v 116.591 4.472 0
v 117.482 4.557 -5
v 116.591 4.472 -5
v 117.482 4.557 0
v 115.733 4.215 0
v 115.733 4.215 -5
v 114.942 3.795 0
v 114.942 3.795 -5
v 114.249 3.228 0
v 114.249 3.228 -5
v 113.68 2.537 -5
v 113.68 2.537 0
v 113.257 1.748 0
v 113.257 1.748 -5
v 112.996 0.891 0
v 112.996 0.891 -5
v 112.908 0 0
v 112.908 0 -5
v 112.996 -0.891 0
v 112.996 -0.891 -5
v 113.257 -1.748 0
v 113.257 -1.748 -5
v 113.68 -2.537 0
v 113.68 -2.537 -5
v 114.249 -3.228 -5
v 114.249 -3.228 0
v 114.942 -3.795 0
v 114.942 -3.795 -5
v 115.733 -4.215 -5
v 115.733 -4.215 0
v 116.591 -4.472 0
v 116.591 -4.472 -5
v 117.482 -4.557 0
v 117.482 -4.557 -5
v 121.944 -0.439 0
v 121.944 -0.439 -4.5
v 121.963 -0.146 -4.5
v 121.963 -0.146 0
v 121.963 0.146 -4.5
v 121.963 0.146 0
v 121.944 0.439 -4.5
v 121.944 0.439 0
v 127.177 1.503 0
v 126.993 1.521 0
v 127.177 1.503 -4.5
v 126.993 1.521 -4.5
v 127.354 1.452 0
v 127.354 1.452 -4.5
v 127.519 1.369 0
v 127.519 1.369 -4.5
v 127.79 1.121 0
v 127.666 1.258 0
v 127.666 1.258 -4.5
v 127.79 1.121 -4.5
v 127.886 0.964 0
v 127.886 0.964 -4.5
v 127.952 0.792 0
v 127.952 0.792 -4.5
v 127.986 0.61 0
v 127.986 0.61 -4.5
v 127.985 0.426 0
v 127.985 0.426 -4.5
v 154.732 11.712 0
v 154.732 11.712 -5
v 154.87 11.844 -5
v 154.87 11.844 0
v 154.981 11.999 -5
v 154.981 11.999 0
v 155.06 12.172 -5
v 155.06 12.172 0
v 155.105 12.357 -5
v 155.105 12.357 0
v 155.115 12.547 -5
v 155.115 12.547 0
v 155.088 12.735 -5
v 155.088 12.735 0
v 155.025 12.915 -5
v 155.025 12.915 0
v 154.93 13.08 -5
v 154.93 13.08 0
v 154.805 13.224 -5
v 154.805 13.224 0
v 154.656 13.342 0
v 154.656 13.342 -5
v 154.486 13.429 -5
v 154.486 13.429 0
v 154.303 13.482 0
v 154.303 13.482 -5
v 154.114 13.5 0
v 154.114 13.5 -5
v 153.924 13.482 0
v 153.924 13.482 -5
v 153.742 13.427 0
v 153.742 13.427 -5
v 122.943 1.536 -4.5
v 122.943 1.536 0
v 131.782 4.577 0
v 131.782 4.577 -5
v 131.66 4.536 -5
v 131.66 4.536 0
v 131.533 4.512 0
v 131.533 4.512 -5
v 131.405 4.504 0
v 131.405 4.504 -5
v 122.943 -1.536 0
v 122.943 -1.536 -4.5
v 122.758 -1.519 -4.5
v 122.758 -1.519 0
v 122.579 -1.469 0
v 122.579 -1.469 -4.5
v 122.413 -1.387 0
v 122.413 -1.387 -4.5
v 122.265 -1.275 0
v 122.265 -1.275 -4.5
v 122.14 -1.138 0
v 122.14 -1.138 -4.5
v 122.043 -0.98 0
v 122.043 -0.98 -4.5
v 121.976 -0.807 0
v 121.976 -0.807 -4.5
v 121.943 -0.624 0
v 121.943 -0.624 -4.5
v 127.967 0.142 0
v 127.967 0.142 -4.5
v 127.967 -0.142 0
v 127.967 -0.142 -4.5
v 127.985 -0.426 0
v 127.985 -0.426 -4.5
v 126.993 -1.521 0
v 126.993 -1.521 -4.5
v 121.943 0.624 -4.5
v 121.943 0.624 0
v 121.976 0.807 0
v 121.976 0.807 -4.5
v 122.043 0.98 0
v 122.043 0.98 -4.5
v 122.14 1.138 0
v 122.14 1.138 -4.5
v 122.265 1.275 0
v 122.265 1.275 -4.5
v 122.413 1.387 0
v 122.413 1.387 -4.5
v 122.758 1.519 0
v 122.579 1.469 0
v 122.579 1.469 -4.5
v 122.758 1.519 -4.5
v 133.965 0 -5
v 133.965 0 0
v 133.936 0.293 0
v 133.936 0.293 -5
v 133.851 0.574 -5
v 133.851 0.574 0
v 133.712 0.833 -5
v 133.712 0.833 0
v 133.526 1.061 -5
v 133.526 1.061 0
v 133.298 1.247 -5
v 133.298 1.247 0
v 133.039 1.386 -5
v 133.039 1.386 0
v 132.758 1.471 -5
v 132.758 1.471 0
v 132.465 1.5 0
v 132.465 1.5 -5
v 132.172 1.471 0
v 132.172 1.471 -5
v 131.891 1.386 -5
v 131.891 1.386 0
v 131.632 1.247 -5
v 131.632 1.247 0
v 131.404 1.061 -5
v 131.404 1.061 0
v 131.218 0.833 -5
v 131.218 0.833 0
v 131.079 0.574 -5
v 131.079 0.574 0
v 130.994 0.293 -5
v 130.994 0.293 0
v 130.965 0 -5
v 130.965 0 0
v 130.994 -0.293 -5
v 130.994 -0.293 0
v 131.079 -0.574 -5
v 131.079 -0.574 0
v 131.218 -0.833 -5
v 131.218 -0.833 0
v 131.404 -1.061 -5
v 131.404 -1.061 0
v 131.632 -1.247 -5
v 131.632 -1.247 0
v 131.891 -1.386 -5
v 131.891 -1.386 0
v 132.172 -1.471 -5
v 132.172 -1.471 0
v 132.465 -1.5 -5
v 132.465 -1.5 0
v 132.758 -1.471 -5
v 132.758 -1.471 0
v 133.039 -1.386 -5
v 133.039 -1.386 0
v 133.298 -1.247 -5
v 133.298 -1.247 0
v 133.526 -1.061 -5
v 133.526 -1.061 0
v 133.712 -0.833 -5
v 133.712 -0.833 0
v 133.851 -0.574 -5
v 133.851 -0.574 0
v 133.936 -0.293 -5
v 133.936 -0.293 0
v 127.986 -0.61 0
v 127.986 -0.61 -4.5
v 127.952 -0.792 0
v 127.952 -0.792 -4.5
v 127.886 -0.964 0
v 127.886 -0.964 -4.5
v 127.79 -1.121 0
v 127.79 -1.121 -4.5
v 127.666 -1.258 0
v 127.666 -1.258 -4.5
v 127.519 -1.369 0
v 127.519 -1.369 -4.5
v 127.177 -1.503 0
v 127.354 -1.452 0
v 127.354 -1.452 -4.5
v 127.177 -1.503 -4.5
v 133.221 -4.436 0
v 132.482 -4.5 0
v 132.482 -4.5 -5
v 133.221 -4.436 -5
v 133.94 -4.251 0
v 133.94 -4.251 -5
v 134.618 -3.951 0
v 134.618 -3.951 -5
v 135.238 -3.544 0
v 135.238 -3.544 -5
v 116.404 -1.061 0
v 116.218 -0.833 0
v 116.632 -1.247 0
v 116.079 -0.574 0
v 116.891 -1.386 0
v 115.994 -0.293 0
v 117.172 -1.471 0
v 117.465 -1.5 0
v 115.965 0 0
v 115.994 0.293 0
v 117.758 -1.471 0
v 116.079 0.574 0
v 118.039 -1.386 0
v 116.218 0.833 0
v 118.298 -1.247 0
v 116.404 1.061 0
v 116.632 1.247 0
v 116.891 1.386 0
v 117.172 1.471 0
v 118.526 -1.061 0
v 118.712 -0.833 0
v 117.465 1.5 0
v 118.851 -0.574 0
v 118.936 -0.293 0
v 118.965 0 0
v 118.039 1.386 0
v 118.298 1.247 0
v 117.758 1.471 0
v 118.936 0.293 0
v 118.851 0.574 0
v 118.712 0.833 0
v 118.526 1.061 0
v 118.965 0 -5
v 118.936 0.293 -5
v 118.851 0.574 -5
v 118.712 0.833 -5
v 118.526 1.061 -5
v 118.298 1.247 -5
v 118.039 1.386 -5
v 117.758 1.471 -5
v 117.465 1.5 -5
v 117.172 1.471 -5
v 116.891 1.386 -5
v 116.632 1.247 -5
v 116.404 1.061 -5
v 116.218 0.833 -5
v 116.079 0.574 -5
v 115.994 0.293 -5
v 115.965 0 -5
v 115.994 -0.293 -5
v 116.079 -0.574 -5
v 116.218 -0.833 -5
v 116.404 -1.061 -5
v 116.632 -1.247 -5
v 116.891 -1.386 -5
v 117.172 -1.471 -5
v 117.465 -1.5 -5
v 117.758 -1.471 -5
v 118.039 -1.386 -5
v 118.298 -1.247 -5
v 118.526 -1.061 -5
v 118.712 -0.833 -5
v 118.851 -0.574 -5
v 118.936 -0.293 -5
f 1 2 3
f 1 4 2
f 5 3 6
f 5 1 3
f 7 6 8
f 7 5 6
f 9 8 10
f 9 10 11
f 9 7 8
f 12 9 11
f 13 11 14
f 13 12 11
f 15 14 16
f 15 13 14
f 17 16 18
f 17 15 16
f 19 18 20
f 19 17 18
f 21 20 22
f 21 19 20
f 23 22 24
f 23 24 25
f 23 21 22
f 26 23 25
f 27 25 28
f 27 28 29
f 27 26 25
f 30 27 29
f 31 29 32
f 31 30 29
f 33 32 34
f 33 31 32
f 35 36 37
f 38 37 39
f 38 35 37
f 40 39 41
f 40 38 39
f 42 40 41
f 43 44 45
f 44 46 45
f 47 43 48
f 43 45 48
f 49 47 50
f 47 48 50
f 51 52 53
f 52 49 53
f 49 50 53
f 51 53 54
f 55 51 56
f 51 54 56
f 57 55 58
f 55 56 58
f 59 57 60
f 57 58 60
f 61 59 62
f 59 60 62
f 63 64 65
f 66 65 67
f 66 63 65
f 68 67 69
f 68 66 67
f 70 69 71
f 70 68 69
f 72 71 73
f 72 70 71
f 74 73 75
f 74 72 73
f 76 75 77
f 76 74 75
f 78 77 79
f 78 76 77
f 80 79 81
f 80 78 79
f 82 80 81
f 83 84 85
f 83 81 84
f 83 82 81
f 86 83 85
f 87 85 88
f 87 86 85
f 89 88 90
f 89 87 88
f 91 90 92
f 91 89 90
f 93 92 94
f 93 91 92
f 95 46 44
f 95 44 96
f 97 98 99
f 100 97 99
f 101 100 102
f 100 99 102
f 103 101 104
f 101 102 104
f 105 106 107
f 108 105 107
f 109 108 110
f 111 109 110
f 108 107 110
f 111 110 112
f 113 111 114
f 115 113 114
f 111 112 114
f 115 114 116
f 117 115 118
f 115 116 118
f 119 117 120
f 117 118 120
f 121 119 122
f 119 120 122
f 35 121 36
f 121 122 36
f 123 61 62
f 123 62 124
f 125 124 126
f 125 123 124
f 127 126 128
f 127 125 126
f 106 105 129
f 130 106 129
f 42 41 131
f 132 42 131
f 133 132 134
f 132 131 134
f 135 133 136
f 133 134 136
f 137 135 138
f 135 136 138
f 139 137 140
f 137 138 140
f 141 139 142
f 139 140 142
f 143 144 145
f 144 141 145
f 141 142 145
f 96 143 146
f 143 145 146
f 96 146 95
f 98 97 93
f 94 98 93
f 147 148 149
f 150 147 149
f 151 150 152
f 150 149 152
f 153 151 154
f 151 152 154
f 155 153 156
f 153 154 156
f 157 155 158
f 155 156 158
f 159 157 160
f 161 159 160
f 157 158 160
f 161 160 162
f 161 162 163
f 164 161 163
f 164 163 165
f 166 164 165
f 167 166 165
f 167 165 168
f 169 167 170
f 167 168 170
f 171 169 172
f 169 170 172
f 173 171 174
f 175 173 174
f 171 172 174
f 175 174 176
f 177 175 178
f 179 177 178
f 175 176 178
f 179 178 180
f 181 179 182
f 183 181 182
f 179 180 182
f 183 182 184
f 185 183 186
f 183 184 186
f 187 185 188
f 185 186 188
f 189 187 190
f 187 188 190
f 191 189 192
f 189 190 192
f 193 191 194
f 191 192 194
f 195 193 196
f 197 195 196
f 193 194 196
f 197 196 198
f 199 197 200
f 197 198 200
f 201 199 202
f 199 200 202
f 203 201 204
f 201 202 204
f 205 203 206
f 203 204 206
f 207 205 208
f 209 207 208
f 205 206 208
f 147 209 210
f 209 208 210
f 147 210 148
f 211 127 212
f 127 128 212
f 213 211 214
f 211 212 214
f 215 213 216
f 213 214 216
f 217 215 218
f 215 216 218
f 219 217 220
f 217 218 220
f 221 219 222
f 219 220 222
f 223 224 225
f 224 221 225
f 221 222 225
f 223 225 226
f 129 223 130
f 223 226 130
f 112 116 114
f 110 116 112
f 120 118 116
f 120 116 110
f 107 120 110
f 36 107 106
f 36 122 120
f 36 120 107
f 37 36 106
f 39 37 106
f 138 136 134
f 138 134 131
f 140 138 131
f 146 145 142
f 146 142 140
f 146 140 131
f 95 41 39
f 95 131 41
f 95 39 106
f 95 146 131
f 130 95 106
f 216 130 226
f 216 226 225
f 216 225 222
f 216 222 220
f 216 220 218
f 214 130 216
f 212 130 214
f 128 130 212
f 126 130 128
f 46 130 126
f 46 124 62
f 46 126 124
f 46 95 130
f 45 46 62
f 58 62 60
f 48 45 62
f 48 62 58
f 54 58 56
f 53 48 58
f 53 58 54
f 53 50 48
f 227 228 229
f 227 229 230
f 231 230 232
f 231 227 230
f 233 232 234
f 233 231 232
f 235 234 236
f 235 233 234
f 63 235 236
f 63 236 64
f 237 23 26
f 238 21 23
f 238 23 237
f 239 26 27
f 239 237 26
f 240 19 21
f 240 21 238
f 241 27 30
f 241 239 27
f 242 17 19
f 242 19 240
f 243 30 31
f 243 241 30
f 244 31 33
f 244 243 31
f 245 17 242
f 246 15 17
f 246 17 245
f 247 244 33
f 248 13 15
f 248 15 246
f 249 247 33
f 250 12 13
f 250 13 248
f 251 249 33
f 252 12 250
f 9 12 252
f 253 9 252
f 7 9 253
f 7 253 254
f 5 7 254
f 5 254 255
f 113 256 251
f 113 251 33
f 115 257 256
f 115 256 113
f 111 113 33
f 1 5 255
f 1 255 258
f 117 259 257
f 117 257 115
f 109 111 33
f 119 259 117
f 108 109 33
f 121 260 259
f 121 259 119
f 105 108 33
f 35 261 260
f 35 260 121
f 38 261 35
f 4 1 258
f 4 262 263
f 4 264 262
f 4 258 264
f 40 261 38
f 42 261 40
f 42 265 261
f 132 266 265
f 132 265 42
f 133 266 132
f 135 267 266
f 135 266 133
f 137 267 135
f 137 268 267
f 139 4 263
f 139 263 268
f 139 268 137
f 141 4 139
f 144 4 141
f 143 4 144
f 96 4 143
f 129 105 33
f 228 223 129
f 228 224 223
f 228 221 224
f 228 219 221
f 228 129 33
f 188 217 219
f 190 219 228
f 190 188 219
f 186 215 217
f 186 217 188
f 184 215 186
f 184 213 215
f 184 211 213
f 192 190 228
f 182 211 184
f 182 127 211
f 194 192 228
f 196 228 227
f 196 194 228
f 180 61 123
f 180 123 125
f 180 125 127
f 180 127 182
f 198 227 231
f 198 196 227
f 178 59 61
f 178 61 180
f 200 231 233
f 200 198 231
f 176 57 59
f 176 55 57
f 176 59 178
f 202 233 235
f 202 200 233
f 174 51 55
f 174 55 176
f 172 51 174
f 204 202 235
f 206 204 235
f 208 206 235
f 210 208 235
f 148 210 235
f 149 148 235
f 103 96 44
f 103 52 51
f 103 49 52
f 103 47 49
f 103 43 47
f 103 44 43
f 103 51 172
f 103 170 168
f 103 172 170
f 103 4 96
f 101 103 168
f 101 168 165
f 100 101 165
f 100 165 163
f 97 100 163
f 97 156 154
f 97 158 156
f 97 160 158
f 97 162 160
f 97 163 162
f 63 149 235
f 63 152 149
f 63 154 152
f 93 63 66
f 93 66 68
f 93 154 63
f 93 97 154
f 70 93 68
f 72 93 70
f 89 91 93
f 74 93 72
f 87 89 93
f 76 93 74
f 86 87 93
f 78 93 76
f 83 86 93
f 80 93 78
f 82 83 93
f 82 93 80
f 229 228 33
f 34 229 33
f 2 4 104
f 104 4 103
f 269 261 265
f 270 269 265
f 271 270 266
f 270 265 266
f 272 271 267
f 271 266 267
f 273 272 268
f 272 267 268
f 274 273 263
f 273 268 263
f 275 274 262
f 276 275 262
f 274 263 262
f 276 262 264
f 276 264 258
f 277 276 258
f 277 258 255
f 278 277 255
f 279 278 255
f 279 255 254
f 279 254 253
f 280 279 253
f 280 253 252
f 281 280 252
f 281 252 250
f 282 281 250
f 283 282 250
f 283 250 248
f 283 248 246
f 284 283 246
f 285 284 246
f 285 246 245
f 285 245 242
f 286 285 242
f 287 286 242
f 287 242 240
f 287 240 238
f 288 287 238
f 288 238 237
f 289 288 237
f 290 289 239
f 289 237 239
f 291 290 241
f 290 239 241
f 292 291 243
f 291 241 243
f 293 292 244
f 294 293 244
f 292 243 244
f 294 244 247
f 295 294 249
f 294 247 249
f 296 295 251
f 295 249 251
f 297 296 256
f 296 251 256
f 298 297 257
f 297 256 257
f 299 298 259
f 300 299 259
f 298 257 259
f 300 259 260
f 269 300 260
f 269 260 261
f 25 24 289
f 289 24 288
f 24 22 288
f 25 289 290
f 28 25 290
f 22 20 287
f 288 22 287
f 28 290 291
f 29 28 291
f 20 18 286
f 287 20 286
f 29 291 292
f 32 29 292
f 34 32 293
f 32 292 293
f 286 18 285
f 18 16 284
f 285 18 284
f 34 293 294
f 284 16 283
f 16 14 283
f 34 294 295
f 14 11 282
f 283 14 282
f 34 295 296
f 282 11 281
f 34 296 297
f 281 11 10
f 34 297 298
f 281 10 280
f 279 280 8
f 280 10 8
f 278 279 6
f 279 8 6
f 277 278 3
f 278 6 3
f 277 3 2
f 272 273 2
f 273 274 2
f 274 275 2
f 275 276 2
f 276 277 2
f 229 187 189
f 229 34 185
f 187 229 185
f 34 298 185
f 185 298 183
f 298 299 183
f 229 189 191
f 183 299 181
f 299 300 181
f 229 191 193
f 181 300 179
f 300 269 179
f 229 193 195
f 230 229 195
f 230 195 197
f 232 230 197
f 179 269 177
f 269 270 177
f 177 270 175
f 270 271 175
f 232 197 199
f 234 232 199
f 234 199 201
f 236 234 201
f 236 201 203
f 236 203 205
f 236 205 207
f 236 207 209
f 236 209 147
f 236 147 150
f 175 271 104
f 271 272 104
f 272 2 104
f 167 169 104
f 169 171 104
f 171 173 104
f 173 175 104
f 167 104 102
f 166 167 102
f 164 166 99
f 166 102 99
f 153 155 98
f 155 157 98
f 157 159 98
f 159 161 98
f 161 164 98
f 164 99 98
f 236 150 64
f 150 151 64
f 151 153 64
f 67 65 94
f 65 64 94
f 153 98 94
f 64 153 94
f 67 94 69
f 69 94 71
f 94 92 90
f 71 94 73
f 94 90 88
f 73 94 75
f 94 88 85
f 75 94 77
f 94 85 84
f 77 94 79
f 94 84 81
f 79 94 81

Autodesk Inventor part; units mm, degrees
ref_plane "YZ Plane" through (0, 0, 0) normal (1, 0, 0) x (0, 1, 0)
ref_plane "XZ Plane" through (0, 0, 0) normal (0, 1, 0) x (-1, 0, 0)
ref_plane "XY Plane" through (0, 0, 0) normal (0, 0, 1) x (1, 0, 0)
sketch "スケッチ1" plane through (0, 0, 0) normal (0, 0, 1) x (1, 0, 0)
  circle A0 centre (132.465, 0) radius 1.5
  circle A1 centre (45, 0) radius 1.5
  circle A2 centre (102.465, 0) radius 1.5
  circle A3 centre (72.465, 0) radius 1.5
  circle A4 centre (15, 0) radius 1.5
  circle A5 centre (30, 0) radius 1.5
  circle A6 centre (87.465, 0) radius 1.5
  circle A7 centre (117.465, 0) radius 1.5
  circle A8 centre (60, 0) radius 1.5
  circle A9 centre (0, 0) radius 1.5
  line L0 (132.482, -4.5) -> (0.0189, -5)
  arc A10 (0.0189, 5) -> (0.0189, -5) centre (0, 0) ccw
  line L1 (0.0189, 5) -> (132.482, 4.5)
  arc A11 (132.482, -4.5) -> (132.482, 4.5) centre (132.465, 0) ccw
  circle A12 centre (117.465, 0) radius 4.5566
  line L2 (135.2384, -3.5437) -> (160.3015, 16.0714)
  circle A13 centre (132.465, 0) radius 4.5
  line L3 (130.7828, 4.1737) -> (160.3015, 16.0714)
  circle A14 centre (154.1156, 12.5) radius 1
  point P0 (117.4822, -4.5566)
  point P1 (154.732, 11.7125)
  point P2 (153.7418, 13.4275)
  point P3 (131.6004, 4.5033)
  point P4 (117.4822, 4.5566)
  dimension "d0" = 2
  dimension "d1" = 25
  dimension "d2" = 150
extrude "押し出し1" add sketch "スケッチ1" against normal blind 5 contours A13 A11 | L0 A12 L1 L3 A13 | A12 | A11 L1 L3 A14 L2 | L3 L1 A13 | A14
fillet "フィレット1" radius 1 1 edges at (131.6004, 4.5033, -2.5)
sketch "スケッチ2" plane through (0, 0, 0) normal (0, 0, 1) x (1, 0, 0)
  circle A0 centre (117.465, 0) radius 1.5 projected
  circle A1 centre (132.465, 0) radius 1.5 projected
  line L0 (132.482, -4.5) -> (117.4822, -4.5566) projected
  arc A2 (117.4822, 4.5566) -> (117.4822, -4.5566) centre (117.465, 0) ccw projected
  line L1 (117.4822, 4.5566) -> (131.4045, 4.504) projected
  arc A3 (131.4045, 4.504) -> (131.7821, 4.5765) centre (131.4083, 5.504) ccw projected
  line L2 (131.7821, 4.5765) -> (153.7418, 13.4275) projected
  arc A4 (154.732, 11.7125) -> (153.7418, 13.4275) centre (154.1156, 12.5) ccw projected
  line L3 (154.732, 11.7125) -> (135.2384, -3.5437) projected
  arc A5 (132.482, -4.5) -> (135.2384, -3.5437) centre (132.465, 0) ccw projected
  line L4 (131.3932, 1.5041) -> (117.4709, 1.5566)
  arc A6 (117.4709, 1.5566) -> (117.4709, -1.5566) centre (117.465, 0) ccw
  line L5 (117.4709, -1.5566) -> (132.4707, -1.5)
  arc A7 (132.4707, -1.5) -> (133.3895, -1.1812) centre (132.465, 0) ccw
  line L6 (133.3895, -1.1812) -> (141.7438, 5.3571)
  line L7 (141.7438, 5.3571) -> (132.9036, 1.794)
  arc A8 (131.3932, 1.5041) -> (132.9036, 1.794) centre (131.4083, 5.504) ccw
  circle A9 centre (117.465, 0) radius 4.5
  circle A10 centre (132.465, 0) radius 4.5
  circle A11 centre (136.965, 2.8567) radius 1
  point P0 (0, 0)
  point P1 (128.2281, -1.516)
  point P2 (128.2281, 1.516)
  point P3 (121.693, 1.5407)
  point P4 (121.693, -1.5407)
  dimension "d6" = 3
  dimension "d7" = 3
  dimension "d8" = 3
  dimension "d9" = 2
extrude "押し出し2" cut sketch "スケッチ2" against normal blind 4.5 contours L5 A9 L4 A10
fillet "フィレット2" radius 1 4 edges at (121.693, 1.5407, -2.25) (121.693, -1.5407, -2.25) (128.2281, 1.516, -2.25) (128.2281, -1.516, -2.25)
properties part number "カウンター 先端部" material "ポリカーボネート、クリア"
